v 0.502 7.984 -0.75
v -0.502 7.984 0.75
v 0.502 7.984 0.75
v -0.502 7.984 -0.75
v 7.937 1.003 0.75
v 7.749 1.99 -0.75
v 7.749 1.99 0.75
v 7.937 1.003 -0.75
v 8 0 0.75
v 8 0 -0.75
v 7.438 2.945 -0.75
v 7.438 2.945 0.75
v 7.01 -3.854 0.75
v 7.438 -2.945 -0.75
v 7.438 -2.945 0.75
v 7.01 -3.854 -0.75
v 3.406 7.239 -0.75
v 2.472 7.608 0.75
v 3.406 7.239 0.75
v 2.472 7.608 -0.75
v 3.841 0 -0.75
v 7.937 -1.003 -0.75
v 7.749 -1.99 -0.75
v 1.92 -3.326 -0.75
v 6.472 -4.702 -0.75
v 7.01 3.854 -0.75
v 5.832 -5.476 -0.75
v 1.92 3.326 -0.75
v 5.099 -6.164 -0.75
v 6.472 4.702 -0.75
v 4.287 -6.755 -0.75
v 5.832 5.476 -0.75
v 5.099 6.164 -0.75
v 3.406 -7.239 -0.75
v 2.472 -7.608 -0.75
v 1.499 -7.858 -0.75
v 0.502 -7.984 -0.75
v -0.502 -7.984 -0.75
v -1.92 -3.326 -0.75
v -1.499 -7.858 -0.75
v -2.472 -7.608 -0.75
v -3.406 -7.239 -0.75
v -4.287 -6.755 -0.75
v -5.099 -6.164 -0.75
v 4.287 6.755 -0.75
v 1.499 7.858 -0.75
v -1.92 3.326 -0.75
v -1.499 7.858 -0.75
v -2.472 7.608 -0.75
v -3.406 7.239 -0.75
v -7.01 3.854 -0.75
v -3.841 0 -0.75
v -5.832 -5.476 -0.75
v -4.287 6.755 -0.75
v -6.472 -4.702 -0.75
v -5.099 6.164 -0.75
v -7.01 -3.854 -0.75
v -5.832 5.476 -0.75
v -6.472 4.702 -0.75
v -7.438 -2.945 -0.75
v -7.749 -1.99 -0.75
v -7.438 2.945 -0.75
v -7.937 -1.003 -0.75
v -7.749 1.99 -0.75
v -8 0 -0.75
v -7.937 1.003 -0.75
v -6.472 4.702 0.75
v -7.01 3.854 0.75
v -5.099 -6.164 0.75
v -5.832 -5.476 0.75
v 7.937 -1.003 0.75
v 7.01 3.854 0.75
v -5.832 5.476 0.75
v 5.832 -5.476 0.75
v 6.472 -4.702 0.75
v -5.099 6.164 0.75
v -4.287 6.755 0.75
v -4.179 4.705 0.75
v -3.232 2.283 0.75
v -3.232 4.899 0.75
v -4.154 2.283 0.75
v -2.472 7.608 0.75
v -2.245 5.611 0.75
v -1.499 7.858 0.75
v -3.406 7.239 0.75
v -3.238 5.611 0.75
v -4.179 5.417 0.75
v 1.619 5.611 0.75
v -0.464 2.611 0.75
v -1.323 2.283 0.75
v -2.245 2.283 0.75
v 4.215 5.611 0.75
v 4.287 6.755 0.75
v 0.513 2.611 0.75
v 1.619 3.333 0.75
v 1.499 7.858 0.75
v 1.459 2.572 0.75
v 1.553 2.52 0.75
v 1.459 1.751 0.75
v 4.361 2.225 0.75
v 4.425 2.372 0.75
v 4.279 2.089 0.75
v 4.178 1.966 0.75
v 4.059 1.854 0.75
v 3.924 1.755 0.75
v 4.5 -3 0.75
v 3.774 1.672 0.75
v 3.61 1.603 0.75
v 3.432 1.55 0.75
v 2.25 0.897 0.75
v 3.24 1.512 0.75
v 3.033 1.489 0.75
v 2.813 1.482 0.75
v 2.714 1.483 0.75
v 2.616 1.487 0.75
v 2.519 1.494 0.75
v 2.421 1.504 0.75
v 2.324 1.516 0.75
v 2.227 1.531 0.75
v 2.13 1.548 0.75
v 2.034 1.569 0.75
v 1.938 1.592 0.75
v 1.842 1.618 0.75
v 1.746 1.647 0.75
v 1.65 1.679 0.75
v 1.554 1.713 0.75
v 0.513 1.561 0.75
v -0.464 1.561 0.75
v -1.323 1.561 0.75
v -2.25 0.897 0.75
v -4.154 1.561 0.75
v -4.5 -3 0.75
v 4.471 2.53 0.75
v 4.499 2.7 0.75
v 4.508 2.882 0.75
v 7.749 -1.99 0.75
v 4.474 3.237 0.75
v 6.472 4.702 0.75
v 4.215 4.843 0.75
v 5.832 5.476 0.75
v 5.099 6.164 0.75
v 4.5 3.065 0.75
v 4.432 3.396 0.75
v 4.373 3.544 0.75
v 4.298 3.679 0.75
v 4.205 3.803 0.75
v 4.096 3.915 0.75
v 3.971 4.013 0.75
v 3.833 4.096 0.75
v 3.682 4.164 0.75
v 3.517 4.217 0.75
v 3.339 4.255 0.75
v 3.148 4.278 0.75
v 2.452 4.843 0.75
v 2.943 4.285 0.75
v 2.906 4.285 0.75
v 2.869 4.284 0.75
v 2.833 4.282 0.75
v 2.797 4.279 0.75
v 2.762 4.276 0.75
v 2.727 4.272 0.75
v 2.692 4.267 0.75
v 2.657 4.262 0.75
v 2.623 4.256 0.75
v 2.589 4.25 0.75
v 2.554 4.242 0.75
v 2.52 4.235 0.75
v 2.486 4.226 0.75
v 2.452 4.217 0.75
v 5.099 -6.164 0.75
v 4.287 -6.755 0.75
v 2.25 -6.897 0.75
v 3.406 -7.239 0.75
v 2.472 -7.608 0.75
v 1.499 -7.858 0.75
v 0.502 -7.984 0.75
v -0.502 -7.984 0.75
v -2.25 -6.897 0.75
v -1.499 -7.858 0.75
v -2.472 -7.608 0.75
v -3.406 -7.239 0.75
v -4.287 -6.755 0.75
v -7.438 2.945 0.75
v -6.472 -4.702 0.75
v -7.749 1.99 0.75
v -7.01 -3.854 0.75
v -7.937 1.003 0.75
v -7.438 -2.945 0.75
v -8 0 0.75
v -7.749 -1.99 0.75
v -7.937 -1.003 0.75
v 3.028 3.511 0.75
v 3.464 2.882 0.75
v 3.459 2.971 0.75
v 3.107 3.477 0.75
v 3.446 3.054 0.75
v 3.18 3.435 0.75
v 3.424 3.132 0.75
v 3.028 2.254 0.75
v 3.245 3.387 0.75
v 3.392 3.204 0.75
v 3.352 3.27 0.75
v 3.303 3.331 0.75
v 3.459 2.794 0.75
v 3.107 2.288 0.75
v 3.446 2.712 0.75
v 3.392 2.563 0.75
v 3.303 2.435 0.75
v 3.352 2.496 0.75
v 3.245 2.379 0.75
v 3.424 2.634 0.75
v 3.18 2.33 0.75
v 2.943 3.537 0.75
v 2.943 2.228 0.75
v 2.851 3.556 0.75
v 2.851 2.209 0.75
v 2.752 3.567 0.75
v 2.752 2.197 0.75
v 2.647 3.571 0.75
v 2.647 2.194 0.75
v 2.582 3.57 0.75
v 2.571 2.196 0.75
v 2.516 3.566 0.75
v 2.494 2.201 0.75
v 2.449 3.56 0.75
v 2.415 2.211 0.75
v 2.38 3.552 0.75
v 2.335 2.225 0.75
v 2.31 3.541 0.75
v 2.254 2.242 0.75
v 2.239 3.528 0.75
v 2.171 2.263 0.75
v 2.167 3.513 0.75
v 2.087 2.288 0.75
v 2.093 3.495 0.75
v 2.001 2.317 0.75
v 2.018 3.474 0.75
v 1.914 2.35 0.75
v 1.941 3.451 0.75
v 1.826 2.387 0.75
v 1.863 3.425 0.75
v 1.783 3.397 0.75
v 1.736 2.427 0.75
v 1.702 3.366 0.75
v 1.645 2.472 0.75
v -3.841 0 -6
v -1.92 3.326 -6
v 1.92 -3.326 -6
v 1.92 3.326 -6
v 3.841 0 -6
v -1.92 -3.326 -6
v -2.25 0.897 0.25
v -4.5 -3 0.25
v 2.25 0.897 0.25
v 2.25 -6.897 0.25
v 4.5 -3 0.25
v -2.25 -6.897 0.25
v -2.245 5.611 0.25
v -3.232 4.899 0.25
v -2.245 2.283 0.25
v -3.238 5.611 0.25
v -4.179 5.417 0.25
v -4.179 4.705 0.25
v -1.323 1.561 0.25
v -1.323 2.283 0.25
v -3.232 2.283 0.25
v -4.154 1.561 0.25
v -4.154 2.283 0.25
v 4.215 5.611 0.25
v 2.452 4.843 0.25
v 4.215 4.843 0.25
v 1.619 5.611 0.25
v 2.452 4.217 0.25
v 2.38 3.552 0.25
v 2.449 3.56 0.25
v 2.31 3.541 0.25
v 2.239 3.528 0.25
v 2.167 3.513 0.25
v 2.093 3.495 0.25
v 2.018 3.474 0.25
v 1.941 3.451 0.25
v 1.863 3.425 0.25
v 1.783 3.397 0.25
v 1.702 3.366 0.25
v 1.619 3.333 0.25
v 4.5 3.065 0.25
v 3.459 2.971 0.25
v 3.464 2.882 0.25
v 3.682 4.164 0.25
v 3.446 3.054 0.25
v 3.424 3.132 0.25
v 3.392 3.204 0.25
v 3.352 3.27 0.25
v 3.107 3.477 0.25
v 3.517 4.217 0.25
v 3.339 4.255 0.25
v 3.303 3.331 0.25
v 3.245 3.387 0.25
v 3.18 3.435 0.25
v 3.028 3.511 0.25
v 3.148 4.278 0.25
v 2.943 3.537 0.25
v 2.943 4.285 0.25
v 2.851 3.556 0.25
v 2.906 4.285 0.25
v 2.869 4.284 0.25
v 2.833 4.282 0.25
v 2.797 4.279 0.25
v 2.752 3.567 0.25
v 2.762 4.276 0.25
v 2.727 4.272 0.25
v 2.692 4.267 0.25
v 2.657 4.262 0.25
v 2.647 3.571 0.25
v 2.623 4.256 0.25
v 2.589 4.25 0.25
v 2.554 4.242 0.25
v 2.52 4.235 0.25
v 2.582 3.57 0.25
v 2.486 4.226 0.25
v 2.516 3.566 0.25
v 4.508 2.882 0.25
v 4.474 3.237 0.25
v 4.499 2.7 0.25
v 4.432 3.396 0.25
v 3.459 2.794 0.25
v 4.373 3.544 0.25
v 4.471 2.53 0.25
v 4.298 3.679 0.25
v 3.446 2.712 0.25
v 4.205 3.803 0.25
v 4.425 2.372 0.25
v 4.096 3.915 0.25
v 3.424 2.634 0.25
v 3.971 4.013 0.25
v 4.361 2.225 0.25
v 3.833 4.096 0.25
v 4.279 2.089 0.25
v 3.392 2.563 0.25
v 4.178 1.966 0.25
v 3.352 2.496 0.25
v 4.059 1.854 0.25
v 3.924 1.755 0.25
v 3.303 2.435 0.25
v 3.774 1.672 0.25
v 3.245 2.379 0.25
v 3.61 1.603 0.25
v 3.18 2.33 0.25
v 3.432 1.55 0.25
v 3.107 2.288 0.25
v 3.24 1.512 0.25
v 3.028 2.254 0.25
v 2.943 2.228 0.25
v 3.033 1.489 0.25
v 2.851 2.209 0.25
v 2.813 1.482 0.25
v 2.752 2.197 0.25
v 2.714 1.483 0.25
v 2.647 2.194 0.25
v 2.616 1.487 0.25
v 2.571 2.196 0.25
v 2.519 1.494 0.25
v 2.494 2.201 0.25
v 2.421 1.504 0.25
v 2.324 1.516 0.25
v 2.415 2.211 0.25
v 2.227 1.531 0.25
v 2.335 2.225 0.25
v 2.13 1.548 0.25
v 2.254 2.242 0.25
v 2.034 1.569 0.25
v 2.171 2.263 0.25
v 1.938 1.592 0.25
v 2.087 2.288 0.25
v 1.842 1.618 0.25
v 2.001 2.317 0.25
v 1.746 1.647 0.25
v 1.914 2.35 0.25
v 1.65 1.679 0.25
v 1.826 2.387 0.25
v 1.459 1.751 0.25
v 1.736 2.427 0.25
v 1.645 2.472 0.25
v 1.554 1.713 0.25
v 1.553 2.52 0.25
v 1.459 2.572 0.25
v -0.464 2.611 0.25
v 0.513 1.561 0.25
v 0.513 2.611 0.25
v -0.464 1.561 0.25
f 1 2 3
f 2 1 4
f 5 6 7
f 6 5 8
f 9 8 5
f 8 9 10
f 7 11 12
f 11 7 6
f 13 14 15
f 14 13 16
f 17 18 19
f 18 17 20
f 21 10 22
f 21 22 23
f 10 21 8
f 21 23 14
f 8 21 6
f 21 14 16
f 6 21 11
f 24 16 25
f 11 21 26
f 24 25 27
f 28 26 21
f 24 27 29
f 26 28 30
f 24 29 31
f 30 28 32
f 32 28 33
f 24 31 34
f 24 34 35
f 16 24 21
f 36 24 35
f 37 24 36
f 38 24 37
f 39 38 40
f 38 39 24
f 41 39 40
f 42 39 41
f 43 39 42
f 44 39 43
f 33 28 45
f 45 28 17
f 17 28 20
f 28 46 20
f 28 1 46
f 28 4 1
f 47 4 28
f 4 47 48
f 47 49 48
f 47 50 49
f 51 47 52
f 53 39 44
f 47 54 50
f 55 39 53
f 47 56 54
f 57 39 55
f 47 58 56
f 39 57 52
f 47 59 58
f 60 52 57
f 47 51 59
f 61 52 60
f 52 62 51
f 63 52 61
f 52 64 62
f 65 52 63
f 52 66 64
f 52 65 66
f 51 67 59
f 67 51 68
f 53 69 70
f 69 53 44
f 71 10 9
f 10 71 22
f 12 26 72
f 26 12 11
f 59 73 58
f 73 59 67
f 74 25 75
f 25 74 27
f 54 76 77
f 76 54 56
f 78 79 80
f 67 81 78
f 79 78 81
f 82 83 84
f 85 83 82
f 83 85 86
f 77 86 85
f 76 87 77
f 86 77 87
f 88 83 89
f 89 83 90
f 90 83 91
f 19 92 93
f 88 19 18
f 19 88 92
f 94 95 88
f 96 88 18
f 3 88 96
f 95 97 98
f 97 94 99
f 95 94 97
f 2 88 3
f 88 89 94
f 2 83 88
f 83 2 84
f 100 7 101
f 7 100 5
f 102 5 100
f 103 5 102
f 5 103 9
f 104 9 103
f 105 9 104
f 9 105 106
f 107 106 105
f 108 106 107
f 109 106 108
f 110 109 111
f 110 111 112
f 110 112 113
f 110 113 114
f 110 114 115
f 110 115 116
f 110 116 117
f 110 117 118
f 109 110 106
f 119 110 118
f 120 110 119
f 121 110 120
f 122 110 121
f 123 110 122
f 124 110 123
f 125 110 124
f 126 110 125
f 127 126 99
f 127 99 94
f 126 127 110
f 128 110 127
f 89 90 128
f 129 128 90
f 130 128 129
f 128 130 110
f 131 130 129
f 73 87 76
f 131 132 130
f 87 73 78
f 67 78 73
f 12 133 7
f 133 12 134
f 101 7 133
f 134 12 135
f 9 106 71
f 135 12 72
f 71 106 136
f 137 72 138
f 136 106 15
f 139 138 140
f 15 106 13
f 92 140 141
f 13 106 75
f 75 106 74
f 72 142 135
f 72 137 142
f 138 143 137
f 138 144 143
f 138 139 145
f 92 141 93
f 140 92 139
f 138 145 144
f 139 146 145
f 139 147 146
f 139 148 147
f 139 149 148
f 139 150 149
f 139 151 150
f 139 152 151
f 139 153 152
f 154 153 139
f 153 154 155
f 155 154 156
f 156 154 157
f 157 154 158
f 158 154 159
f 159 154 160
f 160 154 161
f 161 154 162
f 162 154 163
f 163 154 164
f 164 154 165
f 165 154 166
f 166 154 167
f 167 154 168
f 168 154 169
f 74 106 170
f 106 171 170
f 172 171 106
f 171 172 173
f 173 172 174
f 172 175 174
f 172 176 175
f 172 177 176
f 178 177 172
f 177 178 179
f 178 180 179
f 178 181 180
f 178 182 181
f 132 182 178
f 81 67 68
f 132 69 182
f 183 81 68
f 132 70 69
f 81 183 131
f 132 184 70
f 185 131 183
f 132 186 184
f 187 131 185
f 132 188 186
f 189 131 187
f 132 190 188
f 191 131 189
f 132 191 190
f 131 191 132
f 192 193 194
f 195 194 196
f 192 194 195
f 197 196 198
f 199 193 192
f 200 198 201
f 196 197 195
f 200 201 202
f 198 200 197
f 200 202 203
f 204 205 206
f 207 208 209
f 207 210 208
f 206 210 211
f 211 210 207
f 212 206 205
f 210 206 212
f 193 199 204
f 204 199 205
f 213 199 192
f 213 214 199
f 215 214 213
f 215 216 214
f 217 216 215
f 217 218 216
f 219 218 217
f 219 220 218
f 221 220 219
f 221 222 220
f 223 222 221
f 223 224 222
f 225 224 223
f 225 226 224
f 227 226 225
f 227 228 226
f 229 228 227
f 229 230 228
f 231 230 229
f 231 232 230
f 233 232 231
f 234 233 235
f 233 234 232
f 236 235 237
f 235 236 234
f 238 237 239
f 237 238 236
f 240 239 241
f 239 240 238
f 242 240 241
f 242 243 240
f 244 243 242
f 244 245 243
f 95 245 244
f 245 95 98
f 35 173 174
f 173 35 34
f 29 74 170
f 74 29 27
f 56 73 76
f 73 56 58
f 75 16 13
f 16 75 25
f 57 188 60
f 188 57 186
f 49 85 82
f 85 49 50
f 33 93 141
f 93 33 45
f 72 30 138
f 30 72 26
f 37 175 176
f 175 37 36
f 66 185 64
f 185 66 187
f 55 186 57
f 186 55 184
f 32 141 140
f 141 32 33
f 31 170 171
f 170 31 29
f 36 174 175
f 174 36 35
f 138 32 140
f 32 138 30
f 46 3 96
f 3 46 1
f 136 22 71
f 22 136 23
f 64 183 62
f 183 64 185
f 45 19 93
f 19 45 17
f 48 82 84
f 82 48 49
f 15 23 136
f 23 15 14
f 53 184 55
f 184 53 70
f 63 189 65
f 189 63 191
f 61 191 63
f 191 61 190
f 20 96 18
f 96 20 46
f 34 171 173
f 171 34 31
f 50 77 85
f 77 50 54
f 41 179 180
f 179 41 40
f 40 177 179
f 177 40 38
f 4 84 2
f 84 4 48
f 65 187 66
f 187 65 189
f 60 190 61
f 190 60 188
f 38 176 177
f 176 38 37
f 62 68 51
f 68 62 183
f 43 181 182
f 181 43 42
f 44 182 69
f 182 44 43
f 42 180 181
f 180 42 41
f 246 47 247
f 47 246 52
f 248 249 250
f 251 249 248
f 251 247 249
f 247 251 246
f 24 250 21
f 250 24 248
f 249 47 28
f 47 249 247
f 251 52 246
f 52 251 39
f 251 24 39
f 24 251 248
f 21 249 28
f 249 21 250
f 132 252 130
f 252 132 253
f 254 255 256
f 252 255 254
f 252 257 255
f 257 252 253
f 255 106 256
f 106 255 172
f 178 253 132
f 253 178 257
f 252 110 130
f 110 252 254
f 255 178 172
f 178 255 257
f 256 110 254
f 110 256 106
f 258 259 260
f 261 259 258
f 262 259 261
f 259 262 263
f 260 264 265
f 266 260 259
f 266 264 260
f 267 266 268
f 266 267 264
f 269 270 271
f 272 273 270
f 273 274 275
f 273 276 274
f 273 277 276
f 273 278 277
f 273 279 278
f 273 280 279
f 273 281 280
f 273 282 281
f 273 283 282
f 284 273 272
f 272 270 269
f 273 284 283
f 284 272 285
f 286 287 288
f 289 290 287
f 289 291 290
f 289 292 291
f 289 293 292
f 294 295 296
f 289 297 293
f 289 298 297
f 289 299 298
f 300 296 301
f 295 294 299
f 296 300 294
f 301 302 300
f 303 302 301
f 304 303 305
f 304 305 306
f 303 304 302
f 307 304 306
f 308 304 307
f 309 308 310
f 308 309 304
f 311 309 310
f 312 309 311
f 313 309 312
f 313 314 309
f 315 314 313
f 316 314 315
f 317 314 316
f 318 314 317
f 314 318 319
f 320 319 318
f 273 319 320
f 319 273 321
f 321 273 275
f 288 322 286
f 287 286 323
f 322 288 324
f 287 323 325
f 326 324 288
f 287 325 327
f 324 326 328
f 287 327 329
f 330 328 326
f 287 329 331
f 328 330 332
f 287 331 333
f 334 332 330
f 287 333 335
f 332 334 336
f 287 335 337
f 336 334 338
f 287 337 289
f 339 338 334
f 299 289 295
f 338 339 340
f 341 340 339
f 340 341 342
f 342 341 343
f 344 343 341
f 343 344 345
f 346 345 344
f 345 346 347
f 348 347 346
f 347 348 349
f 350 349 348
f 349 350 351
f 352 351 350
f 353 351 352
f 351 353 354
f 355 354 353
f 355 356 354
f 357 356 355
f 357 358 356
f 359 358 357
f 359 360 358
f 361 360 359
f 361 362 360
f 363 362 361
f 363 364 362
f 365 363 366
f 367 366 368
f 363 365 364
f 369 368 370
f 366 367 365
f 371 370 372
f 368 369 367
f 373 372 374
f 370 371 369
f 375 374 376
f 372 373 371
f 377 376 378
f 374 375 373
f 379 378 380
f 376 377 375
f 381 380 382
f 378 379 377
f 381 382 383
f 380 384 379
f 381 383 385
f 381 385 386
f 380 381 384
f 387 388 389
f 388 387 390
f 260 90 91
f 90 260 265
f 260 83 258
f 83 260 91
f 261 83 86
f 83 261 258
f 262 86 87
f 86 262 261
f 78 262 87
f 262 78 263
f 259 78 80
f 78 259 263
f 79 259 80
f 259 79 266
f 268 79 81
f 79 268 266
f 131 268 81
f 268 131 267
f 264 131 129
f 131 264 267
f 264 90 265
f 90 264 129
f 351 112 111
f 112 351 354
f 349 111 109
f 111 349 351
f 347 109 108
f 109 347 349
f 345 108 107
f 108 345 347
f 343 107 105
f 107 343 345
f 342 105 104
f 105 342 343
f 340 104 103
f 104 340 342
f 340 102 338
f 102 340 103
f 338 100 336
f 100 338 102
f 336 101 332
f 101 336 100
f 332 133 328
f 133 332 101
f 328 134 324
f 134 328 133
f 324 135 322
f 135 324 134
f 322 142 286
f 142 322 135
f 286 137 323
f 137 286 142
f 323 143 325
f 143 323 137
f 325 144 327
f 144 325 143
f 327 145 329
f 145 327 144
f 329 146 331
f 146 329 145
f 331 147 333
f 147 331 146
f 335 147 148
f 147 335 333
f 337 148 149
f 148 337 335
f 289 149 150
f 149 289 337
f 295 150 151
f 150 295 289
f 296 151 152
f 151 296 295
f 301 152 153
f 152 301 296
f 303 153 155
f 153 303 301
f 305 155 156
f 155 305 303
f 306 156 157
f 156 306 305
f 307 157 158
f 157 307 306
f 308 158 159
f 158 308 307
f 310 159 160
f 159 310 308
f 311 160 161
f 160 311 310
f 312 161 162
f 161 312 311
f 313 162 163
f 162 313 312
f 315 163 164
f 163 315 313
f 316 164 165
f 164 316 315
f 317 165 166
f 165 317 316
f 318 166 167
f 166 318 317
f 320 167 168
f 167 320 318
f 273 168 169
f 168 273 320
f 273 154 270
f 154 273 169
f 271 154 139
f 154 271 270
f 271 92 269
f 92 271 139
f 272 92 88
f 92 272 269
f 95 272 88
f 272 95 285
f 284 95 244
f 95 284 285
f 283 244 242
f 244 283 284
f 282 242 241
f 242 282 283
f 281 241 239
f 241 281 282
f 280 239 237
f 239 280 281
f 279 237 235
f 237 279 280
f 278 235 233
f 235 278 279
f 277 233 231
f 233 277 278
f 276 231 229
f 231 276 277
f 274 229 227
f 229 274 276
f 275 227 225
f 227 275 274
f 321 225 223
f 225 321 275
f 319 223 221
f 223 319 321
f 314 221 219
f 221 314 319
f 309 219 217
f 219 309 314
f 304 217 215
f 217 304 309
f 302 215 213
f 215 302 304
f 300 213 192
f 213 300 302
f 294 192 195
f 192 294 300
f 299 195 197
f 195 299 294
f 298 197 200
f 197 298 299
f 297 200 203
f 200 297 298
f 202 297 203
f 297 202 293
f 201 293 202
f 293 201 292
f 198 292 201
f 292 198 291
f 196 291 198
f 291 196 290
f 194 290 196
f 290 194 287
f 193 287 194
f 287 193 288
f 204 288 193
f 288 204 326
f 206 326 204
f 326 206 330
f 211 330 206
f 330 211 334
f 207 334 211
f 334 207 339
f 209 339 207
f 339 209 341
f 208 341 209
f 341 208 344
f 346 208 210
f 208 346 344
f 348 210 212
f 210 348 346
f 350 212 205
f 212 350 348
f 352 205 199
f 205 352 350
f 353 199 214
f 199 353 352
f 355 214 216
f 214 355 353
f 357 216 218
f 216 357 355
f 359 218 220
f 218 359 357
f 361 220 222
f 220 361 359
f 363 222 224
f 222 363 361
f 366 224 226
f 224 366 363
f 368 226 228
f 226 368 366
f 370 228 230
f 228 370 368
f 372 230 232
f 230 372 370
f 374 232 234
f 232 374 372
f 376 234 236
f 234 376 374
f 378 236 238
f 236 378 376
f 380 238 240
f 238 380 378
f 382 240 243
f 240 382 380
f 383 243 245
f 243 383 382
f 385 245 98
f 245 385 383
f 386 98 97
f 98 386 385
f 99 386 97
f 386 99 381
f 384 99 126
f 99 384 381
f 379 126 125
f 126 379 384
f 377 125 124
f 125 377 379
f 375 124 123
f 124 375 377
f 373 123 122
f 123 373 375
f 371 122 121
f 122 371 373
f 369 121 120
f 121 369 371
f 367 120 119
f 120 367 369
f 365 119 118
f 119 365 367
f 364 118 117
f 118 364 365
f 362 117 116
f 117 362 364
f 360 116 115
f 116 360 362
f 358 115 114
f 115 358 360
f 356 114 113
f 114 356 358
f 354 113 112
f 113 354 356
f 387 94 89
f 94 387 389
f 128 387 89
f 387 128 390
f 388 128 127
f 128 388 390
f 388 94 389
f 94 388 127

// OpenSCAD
$fn = 50;


difference() {
	union() {
		translate(v = [0, 0, -0.7500000000]) {
			cylinder(h = 1.5000000000, r = 8.0000000000);
		}
		translate(v = [0, 0, -6]) {
			linear_extrude(height = 6) {
				polygon(points = [[3.8408550000, 0.0000000000], [1.9204275000, 3.3262780023], [-1.9204275000, 3.3262780023], [-3.8408550000, 0.0000000000], [-1.9204275000, -3.3262780023], [1.9204275000, -3.3262780023]]);
			}
		}
	}
	union() {
		translate(v = [0, -3, 0.2500000000]) {
			#linear_extrude(height = 0.5000000000) {
				polygon(points = [[4.5000000000, 0.0000000000], [2.2500000000, 3.8971143170], [-2.2500000000, 3.8971143170], [-4.5000000000, 0.0000000000], [-2.2500000000, -3.8971143170], [2.2500000000, -3.8971143170]]);
			}
		}
		#translate(v = [0, 3.5000000000, 0.2500000000]) {
			linear_extrude(height = 0.5000000000) {
				text(font = "SegoiUI:Bold", halign = "center", size = 4, text = "1.5", valign = "center");
			}
		}
	}
}
